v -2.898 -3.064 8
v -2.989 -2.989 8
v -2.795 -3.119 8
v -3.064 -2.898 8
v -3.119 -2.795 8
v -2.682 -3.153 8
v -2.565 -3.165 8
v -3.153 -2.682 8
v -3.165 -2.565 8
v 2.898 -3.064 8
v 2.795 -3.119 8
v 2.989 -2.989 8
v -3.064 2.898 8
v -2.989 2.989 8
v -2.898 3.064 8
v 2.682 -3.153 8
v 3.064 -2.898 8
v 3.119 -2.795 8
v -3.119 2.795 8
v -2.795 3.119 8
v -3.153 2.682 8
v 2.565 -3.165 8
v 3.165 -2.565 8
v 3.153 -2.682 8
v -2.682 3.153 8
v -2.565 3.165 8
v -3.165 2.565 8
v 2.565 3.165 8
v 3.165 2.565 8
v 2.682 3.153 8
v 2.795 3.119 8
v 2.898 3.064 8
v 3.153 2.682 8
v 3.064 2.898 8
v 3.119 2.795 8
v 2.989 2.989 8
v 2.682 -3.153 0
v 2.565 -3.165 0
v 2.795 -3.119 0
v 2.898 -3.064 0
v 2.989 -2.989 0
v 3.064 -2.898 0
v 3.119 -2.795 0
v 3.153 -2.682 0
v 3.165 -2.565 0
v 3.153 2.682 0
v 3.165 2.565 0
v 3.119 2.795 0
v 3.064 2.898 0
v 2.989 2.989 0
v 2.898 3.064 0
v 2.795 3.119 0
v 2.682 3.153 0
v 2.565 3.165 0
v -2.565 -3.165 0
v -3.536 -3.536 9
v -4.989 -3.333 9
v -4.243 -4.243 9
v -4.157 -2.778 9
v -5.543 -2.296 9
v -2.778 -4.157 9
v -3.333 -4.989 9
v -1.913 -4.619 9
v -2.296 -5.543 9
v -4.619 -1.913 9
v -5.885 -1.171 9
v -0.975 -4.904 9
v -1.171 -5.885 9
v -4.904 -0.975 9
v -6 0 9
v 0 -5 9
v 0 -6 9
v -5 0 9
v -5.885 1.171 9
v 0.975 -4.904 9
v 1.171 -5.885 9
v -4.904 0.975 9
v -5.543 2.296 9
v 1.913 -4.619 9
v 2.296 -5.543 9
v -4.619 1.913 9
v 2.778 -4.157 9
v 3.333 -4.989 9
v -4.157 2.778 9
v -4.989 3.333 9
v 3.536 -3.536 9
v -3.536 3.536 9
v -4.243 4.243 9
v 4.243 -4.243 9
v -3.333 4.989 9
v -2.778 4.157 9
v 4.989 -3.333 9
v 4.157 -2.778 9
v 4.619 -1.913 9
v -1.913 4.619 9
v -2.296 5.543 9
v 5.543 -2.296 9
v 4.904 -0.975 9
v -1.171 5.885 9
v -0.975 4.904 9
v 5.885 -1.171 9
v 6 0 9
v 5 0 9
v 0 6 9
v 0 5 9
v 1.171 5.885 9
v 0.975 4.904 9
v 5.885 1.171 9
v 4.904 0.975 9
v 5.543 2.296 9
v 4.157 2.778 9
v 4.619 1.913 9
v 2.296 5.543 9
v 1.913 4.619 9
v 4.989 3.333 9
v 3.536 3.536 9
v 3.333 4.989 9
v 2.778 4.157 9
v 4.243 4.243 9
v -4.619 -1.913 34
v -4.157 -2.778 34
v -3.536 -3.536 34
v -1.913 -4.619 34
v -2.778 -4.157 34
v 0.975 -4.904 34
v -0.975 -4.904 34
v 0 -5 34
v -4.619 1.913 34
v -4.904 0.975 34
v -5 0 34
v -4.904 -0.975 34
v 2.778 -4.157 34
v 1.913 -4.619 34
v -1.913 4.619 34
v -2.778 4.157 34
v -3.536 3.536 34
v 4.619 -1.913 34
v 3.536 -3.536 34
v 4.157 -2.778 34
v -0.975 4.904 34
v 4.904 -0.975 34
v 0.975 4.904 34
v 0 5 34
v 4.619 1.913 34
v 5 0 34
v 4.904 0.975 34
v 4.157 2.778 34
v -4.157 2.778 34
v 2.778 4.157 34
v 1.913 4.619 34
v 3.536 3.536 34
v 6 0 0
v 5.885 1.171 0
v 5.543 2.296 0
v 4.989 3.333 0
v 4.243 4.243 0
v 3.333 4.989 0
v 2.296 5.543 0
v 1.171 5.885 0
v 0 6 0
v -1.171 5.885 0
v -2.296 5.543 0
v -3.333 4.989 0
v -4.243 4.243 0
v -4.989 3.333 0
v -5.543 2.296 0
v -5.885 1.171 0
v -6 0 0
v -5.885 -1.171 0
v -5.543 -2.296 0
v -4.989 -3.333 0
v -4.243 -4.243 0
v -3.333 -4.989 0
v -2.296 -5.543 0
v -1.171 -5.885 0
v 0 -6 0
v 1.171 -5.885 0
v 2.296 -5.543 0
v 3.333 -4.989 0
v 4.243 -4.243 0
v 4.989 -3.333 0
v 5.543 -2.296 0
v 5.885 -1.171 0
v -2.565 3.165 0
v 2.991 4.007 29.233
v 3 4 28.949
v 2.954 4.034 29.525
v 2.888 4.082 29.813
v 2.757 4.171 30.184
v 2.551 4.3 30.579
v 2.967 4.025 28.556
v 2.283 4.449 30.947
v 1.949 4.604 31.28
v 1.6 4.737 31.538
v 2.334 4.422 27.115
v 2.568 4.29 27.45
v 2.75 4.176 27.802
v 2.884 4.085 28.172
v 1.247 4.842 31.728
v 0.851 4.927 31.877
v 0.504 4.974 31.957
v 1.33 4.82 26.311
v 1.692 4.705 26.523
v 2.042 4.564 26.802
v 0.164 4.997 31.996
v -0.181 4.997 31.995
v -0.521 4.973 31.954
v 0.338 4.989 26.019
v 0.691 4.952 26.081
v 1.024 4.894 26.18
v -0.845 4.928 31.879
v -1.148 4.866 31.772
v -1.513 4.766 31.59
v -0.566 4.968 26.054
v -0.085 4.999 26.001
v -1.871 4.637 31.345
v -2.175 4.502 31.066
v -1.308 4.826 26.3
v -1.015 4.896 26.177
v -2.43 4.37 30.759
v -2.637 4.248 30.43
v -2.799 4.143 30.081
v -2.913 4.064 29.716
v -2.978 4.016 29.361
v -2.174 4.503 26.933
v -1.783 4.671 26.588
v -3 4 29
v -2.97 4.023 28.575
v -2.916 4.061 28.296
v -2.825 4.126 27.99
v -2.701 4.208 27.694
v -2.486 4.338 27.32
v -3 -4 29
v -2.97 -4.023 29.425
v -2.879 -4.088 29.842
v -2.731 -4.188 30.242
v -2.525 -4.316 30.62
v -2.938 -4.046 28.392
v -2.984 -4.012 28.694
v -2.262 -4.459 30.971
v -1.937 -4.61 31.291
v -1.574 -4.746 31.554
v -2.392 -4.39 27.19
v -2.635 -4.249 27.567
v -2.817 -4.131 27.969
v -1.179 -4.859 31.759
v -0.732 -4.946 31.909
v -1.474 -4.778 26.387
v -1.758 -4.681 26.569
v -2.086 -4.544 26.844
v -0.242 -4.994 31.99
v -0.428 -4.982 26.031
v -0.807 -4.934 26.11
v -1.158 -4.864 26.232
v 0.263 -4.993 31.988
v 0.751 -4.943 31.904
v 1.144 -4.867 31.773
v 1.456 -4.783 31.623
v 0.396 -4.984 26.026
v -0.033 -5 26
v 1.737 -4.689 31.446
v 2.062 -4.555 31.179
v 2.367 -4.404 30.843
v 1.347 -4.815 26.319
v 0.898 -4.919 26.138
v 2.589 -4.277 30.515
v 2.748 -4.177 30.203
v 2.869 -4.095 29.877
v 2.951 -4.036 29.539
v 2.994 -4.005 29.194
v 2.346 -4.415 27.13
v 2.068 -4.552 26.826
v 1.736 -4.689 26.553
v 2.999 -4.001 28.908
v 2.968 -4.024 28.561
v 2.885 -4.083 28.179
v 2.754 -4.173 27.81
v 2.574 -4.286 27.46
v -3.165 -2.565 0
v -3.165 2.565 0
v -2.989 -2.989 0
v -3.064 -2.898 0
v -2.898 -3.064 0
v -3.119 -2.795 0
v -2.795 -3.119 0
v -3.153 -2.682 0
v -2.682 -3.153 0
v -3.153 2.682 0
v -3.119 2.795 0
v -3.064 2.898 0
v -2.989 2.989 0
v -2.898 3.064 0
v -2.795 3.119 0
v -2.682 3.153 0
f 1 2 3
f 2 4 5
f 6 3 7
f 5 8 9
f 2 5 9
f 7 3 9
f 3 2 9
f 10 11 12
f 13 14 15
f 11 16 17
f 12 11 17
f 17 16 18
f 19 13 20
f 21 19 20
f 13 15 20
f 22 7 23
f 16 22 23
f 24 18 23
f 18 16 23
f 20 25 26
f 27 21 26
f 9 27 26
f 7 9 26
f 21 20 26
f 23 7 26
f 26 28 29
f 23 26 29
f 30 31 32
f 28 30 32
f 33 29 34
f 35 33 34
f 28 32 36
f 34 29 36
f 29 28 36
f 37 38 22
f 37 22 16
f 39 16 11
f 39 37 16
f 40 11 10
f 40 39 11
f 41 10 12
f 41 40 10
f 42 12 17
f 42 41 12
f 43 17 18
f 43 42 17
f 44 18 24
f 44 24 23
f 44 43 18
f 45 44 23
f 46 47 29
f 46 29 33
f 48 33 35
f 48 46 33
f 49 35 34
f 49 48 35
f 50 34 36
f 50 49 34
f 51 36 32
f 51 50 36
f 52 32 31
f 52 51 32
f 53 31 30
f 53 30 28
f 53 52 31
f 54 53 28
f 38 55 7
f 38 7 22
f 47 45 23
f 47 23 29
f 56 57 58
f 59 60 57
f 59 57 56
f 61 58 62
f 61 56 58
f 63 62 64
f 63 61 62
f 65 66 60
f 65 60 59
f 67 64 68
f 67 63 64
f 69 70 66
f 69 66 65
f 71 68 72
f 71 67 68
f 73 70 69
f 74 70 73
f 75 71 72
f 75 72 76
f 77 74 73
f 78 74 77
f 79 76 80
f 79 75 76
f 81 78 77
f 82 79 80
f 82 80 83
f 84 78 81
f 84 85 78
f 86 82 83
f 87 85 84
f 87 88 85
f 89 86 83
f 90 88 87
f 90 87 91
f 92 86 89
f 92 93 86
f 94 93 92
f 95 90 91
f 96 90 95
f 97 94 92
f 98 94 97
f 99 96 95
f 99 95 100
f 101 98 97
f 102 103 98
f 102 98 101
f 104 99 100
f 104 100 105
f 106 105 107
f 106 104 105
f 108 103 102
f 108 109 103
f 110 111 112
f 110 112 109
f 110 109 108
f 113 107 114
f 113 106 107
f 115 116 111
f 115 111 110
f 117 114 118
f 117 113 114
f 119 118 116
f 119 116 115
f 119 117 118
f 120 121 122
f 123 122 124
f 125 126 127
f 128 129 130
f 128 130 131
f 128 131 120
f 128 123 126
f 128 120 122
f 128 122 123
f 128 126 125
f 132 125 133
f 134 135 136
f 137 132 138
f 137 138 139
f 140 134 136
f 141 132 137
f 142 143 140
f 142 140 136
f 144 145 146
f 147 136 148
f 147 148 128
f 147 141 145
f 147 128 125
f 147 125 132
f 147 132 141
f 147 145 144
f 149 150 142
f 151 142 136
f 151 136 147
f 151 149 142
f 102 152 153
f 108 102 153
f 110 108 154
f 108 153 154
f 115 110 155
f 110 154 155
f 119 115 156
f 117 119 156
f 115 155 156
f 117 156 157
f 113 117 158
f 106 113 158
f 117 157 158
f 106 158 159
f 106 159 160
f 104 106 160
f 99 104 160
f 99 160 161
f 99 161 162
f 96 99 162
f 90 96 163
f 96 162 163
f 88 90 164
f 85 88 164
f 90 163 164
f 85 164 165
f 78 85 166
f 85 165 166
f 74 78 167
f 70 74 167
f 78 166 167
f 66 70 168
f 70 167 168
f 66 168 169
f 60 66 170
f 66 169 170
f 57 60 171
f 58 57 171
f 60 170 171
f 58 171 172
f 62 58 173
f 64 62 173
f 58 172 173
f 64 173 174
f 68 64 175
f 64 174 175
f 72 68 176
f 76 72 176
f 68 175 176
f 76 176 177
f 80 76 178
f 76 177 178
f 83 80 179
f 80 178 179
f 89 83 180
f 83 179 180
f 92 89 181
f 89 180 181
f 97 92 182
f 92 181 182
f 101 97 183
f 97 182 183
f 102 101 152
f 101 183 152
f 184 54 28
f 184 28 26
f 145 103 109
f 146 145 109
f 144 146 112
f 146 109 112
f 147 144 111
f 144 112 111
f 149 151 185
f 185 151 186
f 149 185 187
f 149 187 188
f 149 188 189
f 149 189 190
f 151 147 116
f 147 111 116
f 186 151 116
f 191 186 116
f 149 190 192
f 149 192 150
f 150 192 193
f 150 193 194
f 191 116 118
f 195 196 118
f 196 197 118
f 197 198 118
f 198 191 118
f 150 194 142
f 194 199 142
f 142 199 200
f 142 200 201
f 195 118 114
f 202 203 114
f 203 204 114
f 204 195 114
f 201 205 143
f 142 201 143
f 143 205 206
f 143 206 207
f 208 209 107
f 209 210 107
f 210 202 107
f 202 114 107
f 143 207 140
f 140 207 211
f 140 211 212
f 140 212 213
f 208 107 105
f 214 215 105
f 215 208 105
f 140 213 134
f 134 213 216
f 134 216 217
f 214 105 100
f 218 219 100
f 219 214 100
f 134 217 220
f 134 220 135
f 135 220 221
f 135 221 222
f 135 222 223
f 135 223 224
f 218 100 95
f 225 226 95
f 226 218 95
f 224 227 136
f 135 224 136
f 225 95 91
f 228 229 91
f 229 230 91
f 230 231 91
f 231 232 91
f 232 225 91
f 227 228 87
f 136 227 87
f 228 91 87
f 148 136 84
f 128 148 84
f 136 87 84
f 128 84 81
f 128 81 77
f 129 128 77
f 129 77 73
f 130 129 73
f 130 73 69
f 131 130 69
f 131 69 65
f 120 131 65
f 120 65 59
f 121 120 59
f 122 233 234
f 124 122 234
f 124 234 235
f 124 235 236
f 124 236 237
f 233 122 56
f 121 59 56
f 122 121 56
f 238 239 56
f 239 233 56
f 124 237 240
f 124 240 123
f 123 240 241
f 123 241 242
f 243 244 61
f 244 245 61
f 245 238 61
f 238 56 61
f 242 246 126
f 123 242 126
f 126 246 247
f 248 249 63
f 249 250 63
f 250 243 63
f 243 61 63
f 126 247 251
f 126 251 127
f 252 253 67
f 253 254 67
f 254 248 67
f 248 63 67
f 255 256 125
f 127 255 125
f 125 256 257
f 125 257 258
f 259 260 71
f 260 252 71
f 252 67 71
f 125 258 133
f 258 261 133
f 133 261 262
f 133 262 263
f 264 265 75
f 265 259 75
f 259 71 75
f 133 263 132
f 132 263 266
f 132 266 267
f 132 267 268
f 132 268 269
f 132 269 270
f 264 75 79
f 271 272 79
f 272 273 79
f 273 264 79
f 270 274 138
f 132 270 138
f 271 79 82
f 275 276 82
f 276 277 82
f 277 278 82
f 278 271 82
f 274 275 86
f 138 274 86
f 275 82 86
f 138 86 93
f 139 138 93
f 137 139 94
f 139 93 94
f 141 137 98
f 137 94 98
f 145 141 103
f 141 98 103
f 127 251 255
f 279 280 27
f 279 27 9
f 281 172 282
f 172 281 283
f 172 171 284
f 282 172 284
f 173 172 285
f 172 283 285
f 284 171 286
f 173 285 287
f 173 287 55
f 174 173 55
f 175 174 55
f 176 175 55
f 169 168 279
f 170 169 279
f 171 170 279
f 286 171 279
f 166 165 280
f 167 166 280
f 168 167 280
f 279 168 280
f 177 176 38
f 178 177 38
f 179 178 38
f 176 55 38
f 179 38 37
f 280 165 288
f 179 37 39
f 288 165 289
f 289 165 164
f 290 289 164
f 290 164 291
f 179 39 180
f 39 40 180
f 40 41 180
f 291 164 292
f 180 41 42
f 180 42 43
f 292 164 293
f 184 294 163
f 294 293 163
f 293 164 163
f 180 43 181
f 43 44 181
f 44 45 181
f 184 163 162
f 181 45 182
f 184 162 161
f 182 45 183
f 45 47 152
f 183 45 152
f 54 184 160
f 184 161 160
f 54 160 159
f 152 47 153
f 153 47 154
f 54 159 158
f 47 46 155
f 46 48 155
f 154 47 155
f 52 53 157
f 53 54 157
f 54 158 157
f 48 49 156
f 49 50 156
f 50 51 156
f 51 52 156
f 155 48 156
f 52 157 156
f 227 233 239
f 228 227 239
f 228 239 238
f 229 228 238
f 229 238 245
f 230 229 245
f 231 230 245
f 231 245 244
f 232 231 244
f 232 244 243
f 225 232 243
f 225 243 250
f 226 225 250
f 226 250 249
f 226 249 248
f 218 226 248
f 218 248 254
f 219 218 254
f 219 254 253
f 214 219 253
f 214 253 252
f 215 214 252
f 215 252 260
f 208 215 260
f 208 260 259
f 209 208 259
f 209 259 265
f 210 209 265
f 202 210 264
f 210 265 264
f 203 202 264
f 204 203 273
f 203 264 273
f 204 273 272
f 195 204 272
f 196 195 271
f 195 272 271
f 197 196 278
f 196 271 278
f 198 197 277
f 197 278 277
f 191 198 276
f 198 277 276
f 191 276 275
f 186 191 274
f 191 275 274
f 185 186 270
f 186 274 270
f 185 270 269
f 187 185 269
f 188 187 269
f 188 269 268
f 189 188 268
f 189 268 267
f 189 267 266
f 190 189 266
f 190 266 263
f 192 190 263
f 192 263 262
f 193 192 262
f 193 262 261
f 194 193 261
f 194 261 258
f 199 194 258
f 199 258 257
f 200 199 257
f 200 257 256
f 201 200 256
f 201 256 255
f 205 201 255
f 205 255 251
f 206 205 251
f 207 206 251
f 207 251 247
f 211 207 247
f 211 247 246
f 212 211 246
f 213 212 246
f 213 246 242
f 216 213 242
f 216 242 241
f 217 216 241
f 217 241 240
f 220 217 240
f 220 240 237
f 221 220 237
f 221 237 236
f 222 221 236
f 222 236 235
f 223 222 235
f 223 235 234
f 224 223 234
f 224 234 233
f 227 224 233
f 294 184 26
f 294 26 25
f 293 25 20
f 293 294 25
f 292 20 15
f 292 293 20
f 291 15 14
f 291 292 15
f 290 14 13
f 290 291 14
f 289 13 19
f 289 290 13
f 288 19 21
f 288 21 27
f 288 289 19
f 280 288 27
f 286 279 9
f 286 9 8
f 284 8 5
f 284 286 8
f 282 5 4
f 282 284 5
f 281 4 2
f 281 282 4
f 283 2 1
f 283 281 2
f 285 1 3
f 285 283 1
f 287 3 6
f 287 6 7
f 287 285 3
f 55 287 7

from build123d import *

# Parameters (mm, degrees)
SKETCH_1_R          = 5
EXTRUDE_1_DEPTH     = 34
SKETCH_4_R          = 6
EXTRUDE_2_DEPTH     = 9
CUT_EXTRUDE_1_DEPTH = 8
SKETCH_3_R          = 3
CUT_EXTRUDE_2_DEPTH = 12


with BuildPart() as part:
    # 草图1 → 凸台-拉伸1 (new body)
    with BuildSketch(Plane.XY):
        Circle(SKETCH_1_R)
    extrude(amount=EXTRUDE_1_DEPTH)

    # 草图4 → 凸台-拉伸2 (add)
    with BuildSketch(Plane.XY):
        Circle(SKETCH_4_R)
    extrude(amount=EXTRUDE_2_DEPTH)

    # 草图2 → 切除-拉伸1 (cut)
    with BuildSketch(Plane(origin=(0, 0, 0), x_dir=(-1, 0, 0), z_dir=(0, 0, -1))):
        with BuildLine():
            Line((2.565, -3.165), (-2.565, -3.165))
            ThreePointArc((-2.565, -3.165), (-2.989264069, -2.989264069), (-3.165, -2.565))
            Line((-3.165, -2.565), (-3.165, 2.565))
            ThreePointArc((-3.165, 2.565), (-2.989264069, 2.989264069), (-2.565, 3.165))
            Line((-2.565, 3.165), (2.565, 3.165))
            ThreePointArc((2.565, 3.165), (2.989264069, 2.989264069), (3.165, 2.565))
            Line((3.165, 2.565), (3.165, -2.565))
            ThreePointArc((3.165, -2.565), (2.989264069, -2.989264069), (2.565, -3.165))
        make_face()
    extrude(amount=-CUT_EXTRUDE_1_DEPTH, mode=Mode.SUBTRACT)

    # 草图3 → 切除-拉伸2 (cut, through all)
    with BuildSketch(Plane(origin=(0, -5, 0), x_dir=(-1, 0, 0), z_dir=(0, -1, 0))):
        with Locations((0, -29)):
            Circle(SKETCH_3_R)
    extrude(amount=-CUT_EXTRUDE_2_DEPTH, mode=Mode.SUBTRACT)


solid = part.part
